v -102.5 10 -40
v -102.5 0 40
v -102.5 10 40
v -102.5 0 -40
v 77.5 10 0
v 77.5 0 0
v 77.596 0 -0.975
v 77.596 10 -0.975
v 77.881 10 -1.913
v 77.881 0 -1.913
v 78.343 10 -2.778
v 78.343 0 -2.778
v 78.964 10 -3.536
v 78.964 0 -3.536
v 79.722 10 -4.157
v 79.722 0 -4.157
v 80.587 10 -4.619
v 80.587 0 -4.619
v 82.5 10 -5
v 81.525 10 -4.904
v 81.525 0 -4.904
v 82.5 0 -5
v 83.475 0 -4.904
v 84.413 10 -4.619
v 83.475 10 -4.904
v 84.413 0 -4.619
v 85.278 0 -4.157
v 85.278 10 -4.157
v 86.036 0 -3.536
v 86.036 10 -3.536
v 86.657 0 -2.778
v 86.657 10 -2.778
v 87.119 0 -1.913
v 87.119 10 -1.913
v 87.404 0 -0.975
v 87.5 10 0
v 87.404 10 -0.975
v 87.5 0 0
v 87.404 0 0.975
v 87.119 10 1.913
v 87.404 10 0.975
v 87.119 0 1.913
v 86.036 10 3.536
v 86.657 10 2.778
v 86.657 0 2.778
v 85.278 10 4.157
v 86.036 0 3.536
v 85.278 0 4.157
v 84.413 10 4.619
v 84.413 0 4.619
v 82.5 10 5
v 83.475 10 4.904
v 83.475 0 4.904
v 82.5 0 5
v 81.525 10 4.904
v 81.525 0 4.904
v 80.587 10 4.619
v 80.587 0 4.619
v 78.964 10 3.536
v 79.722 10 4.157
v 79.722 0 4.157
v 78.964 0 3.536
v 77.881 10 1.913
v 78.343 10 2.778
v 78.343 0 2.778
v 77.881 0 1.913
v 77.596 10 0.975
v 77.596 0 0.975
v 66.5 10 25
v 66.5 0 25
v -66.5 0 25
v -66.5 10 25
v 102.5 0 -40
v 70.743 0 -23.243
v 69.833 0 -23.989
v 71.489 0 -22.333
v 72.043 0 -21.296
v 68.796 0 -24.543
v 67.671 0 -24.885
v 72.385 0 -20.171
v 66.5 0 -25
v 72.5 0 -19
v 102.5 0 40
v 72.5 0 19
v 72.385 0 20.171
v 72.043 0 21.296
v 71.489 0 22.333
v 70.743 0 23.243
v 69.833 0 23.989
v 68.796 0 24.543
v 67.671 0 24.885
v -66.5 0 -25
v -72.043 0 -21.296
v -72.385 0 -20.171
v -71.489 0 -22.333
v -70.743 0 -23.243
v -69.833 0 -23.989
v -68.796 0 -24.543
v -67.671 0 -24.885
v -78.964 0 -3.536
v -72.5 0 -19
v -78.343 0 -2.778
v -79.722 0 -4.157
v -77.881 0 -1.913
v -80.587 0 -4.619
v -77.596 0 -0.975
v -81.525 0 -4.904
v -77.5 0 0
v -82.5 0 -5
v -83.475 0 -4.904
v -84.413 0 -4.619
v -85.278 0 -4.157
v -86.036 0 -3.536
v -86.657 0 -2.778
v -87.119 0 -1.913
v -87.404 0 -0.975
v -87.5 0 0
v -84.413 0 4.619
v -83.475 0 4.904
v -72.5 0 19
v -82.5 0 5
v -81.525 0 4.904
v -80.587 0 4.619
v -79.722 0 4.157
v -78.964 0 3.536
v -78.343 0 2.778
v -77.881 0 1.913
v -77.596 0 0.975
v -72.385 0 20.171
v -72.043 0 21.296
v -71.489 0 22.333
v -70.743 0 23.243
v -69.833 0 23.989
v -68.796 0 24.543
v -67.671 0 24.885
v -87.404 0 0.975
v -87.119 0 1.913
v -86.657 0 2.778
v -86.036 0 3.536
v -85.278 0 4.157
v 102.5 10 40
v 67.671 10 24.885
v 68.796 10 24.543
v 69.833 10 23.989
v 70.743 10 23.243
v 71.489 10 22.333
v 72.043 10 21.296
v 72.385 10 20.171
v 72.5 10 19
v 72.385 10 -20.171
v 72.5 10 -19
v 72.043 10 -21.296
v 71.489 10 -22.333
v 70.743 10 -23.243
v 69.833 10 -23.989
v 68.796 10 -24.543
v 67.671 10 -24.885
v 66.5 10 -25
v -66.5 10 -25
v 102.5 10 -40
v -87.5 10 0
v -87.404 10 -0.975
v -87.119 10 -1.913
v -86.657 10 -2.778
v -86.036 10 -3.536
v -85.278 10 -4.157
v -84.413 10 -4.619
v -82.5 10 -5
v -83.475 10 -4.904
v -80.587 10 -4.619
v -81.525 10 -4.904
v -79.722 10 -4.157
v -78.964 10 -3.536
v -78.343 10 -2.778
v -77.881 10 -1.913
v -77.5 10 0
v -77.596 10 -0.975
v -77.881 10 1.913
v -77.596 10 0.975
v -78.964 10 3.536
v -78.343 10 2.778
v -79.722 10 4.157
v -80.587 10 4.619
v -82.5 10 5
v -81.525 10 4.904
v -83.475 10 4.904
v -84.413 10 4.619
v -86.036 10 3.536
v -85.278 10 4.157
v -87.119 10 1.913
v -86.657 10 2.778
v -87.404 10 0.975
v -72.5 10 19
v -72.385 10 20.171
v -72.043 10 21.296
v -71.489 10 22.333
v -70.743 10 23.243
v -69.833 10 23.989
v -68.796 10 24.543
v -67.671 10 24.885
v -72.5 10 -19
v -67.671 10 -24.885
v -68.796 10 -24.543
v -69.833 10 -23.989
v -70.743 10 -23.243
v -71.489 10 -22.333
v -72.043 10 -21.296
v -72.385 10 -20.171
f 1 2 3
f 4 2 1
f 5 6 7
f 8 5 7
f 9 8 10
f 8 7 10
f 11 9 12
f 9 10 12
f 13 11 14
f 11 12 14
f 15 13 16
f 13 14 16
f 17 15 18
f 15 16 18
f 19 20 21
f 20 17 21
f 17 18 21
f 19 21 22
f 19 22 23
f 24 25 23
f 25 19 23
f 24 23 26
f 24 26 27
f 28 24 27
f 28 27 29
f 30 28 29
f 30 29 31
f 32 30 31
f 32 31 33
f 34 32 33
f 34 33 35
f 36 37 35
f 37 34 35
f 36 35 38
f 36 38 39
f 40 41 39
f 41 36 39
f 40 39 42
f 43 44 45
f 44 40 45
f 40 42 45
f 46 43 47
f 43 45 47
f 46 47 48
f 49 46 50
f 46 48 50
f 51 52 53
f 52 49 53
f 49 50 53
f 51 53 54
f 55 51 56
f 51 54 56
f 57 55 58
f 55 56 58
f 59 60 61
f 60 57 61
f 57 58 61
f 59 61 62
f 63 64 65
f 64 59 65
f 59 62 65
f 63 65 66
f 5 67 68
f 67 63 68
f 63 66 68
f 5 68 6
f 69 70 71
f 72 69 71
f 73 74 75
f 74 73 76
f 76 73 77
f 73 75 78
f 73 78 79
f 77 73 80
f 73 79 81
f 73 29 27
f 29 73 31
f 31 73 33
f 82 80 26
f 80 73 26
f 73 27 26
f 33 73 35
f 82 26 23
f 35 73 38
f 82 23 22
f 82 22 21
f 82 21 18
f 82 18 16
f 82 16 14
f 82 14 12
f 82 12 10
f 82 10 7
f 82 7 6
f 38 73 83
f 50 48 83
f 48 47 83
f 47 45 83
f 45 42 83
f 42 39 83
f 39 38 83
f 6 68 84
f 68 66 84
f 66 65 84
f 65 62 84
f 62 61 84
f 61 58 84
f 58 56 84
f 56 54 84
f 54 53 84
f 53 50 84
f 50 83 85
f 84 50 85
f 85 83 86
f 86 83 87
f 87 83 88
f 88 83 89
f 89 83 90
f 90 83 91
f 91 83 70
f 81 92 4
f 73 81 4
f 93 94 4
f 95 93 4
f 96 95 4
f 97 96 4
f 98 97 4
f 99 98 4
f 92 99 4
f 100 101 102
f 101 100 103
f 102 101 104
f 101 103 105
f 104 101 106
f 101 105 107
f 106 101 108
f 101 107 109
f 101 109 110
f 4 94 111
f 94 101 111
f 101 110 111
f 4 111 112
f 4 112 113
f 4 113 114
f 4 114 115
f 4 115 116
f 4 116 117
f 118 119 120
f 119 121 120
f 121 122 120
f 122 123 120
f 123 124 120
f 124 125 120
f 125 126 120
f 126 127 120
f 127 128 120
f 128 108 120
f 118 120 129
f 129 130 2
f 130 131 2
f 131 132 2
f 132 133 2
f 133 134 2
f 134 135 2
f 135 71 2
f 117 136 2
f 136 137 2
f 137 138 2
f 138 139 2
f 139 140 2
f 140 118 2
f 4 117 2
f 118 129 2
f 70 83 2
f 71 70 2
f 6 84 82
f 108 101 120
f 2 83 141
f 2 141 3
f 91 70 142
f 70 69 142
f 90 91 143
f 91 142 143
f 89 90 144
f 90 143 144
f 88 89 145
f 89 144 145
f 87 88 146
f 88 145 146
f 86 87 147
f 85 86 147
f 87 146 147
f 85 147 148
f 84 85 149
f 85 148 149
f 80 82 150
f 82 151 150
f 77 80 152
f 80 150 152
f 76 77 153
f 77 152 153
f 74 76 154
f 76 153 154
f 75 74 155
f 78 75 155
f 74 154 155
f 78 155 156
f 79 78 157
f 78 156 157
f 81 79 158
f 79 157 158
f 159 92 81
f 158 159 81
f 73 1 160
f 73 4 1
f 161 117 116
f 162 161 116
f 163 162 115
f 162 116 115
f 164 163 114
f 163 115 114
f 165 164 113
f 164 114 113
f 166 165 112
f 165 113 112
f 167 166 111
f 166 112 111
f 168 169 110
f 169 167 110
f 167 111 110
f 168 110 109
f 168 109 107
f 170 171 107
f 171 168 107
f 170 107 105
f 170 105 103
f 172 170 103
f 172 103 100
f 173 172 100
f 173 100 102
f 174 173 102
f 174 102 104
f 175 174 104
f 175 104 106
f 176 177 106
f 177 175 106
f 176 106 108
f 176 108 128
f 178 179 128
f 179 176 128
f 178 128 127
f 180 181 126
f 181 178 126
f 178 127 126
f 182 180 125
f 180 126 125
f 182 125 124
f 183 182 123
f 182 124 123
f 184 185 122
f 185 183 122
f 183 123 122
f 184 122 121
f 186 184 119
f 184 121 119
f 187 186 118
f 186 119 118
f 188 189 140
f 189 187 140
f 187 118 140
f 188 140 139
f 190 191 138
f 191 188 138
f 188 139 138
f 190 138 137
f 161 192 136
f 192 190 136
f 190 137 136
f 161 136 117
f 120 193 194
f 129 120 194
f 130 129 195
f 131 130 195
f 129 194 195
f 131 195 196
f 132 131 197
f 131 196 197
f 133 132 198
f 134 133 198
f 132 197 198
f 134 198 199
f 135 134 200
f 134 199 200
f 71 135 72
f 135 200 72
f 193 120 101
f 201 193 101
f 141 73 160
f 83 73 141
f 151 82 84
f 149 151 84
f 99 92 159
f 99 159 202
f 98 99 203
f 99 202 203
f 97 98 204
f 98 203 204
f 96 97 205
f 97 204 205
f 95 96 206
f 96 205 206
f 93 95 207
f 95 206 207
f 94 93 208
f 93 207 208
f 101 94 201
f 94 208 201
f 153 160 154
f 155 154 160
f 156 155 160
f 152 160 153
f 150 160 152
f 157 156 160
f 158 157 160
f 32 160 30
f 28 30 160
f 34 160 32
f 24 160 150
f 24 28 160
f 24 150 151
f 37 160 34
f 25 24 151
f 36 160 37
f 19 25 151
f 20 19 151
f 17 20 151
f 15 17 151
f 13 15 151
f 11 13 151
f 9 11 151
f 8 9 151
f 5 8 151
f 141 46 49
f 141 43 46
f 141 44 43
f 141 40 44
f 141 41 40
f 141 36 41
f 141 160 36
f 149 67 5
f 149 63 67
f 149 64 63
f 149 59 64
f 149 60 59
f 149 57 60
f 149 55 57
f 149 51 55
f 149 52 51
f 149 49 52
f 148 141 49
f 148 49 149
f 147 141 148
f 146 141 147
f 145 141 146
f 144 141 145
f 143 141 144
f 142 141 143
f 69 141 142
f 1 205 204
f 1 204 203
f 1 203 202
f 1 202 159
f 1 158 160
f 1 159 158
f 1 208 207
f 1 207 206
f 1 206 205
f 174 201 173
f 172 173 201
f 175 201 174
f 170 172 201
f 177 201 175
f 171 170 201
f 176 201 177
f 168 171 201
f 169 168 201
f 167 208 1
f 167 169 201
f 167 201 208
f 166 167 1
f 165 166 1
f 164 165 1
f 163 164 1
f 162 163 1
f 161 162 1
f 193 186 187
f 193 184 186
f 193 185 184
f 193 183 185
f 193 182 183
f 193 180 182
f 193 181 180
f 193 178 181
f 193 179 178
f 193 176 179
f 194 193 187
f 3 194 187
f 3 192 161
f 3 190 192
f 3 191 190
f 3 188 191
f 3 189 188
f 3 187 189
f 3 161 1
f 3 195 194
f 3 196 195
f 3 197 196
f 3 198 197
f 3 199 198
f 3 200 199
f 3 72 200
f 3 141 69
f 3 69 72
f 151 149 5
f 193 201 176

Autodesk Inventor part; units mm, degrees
ref_plane "YZ Plane" through (0, 0, 0) normal (1, 0, 0) x (0, 1, 0)
ref_plane "XZ Plane" through (0, 0, 0) normal (0, 1, 0) x (-1, 0, 0)
ref_plane "XY Plane" through (0, 0, 0) normal (0, 0, 1) x (1, 0, 0)
sketch "Sketch4" plane through (0, 0, 0) normal (0, 1, 0) x (-1, 0, 0)
  line L0 (72.5, -25) -> (-72.5, -25)
  line L1 (-72.5, -25) -> (-72.5, 25)
  line L2 (-72.5, 25) -> (72.5, 25)
  line L3 (72.5, 25) -> (72.5, -25)
  line L4 (72.5, -25) -> (-72.5, 25) construction
  line L5 (-72.5, -25) -> (72.5, 25) construction
  line L6 (102.5, -40) -> (-102.5, -40)
  line L7 (-102.5, -40) -> (-102.5, 40)
  line L8 (-102.5, 40) -> (102.5, 40)
  line L9 (102.5, 40) -> (102.5, -40)
  line L10 (102.5, -40) -> (-102.5, 40) construction
  line L11 (-102.5, -40) -> (102.5, 40) construction
  circle A0 centre (82.5, 0) radius 5
  circle A1 centre (-82.5, 0) radius 5
  line L12 (0, -25) -> (0, 25) construction
  point P0 (0, 0)
  dimension "d23" = 145
  dimension "d24" = 50
  dimension "d25" = 205
  dimension "d26" = 80
  dimension "d27" = 165
  dimension "d28" = 10
extrude "Extrusion3" add sketch "Sketch4" along normal blind 10
fillet "Fillet2" radius 6 4 edges at (-72.5, 5, -25) (72.5, 5, -25) (72.5, 5, 25) (-72.5, 5, 25)
properties part number "DMF 01 54 lower sheet v2.1"
